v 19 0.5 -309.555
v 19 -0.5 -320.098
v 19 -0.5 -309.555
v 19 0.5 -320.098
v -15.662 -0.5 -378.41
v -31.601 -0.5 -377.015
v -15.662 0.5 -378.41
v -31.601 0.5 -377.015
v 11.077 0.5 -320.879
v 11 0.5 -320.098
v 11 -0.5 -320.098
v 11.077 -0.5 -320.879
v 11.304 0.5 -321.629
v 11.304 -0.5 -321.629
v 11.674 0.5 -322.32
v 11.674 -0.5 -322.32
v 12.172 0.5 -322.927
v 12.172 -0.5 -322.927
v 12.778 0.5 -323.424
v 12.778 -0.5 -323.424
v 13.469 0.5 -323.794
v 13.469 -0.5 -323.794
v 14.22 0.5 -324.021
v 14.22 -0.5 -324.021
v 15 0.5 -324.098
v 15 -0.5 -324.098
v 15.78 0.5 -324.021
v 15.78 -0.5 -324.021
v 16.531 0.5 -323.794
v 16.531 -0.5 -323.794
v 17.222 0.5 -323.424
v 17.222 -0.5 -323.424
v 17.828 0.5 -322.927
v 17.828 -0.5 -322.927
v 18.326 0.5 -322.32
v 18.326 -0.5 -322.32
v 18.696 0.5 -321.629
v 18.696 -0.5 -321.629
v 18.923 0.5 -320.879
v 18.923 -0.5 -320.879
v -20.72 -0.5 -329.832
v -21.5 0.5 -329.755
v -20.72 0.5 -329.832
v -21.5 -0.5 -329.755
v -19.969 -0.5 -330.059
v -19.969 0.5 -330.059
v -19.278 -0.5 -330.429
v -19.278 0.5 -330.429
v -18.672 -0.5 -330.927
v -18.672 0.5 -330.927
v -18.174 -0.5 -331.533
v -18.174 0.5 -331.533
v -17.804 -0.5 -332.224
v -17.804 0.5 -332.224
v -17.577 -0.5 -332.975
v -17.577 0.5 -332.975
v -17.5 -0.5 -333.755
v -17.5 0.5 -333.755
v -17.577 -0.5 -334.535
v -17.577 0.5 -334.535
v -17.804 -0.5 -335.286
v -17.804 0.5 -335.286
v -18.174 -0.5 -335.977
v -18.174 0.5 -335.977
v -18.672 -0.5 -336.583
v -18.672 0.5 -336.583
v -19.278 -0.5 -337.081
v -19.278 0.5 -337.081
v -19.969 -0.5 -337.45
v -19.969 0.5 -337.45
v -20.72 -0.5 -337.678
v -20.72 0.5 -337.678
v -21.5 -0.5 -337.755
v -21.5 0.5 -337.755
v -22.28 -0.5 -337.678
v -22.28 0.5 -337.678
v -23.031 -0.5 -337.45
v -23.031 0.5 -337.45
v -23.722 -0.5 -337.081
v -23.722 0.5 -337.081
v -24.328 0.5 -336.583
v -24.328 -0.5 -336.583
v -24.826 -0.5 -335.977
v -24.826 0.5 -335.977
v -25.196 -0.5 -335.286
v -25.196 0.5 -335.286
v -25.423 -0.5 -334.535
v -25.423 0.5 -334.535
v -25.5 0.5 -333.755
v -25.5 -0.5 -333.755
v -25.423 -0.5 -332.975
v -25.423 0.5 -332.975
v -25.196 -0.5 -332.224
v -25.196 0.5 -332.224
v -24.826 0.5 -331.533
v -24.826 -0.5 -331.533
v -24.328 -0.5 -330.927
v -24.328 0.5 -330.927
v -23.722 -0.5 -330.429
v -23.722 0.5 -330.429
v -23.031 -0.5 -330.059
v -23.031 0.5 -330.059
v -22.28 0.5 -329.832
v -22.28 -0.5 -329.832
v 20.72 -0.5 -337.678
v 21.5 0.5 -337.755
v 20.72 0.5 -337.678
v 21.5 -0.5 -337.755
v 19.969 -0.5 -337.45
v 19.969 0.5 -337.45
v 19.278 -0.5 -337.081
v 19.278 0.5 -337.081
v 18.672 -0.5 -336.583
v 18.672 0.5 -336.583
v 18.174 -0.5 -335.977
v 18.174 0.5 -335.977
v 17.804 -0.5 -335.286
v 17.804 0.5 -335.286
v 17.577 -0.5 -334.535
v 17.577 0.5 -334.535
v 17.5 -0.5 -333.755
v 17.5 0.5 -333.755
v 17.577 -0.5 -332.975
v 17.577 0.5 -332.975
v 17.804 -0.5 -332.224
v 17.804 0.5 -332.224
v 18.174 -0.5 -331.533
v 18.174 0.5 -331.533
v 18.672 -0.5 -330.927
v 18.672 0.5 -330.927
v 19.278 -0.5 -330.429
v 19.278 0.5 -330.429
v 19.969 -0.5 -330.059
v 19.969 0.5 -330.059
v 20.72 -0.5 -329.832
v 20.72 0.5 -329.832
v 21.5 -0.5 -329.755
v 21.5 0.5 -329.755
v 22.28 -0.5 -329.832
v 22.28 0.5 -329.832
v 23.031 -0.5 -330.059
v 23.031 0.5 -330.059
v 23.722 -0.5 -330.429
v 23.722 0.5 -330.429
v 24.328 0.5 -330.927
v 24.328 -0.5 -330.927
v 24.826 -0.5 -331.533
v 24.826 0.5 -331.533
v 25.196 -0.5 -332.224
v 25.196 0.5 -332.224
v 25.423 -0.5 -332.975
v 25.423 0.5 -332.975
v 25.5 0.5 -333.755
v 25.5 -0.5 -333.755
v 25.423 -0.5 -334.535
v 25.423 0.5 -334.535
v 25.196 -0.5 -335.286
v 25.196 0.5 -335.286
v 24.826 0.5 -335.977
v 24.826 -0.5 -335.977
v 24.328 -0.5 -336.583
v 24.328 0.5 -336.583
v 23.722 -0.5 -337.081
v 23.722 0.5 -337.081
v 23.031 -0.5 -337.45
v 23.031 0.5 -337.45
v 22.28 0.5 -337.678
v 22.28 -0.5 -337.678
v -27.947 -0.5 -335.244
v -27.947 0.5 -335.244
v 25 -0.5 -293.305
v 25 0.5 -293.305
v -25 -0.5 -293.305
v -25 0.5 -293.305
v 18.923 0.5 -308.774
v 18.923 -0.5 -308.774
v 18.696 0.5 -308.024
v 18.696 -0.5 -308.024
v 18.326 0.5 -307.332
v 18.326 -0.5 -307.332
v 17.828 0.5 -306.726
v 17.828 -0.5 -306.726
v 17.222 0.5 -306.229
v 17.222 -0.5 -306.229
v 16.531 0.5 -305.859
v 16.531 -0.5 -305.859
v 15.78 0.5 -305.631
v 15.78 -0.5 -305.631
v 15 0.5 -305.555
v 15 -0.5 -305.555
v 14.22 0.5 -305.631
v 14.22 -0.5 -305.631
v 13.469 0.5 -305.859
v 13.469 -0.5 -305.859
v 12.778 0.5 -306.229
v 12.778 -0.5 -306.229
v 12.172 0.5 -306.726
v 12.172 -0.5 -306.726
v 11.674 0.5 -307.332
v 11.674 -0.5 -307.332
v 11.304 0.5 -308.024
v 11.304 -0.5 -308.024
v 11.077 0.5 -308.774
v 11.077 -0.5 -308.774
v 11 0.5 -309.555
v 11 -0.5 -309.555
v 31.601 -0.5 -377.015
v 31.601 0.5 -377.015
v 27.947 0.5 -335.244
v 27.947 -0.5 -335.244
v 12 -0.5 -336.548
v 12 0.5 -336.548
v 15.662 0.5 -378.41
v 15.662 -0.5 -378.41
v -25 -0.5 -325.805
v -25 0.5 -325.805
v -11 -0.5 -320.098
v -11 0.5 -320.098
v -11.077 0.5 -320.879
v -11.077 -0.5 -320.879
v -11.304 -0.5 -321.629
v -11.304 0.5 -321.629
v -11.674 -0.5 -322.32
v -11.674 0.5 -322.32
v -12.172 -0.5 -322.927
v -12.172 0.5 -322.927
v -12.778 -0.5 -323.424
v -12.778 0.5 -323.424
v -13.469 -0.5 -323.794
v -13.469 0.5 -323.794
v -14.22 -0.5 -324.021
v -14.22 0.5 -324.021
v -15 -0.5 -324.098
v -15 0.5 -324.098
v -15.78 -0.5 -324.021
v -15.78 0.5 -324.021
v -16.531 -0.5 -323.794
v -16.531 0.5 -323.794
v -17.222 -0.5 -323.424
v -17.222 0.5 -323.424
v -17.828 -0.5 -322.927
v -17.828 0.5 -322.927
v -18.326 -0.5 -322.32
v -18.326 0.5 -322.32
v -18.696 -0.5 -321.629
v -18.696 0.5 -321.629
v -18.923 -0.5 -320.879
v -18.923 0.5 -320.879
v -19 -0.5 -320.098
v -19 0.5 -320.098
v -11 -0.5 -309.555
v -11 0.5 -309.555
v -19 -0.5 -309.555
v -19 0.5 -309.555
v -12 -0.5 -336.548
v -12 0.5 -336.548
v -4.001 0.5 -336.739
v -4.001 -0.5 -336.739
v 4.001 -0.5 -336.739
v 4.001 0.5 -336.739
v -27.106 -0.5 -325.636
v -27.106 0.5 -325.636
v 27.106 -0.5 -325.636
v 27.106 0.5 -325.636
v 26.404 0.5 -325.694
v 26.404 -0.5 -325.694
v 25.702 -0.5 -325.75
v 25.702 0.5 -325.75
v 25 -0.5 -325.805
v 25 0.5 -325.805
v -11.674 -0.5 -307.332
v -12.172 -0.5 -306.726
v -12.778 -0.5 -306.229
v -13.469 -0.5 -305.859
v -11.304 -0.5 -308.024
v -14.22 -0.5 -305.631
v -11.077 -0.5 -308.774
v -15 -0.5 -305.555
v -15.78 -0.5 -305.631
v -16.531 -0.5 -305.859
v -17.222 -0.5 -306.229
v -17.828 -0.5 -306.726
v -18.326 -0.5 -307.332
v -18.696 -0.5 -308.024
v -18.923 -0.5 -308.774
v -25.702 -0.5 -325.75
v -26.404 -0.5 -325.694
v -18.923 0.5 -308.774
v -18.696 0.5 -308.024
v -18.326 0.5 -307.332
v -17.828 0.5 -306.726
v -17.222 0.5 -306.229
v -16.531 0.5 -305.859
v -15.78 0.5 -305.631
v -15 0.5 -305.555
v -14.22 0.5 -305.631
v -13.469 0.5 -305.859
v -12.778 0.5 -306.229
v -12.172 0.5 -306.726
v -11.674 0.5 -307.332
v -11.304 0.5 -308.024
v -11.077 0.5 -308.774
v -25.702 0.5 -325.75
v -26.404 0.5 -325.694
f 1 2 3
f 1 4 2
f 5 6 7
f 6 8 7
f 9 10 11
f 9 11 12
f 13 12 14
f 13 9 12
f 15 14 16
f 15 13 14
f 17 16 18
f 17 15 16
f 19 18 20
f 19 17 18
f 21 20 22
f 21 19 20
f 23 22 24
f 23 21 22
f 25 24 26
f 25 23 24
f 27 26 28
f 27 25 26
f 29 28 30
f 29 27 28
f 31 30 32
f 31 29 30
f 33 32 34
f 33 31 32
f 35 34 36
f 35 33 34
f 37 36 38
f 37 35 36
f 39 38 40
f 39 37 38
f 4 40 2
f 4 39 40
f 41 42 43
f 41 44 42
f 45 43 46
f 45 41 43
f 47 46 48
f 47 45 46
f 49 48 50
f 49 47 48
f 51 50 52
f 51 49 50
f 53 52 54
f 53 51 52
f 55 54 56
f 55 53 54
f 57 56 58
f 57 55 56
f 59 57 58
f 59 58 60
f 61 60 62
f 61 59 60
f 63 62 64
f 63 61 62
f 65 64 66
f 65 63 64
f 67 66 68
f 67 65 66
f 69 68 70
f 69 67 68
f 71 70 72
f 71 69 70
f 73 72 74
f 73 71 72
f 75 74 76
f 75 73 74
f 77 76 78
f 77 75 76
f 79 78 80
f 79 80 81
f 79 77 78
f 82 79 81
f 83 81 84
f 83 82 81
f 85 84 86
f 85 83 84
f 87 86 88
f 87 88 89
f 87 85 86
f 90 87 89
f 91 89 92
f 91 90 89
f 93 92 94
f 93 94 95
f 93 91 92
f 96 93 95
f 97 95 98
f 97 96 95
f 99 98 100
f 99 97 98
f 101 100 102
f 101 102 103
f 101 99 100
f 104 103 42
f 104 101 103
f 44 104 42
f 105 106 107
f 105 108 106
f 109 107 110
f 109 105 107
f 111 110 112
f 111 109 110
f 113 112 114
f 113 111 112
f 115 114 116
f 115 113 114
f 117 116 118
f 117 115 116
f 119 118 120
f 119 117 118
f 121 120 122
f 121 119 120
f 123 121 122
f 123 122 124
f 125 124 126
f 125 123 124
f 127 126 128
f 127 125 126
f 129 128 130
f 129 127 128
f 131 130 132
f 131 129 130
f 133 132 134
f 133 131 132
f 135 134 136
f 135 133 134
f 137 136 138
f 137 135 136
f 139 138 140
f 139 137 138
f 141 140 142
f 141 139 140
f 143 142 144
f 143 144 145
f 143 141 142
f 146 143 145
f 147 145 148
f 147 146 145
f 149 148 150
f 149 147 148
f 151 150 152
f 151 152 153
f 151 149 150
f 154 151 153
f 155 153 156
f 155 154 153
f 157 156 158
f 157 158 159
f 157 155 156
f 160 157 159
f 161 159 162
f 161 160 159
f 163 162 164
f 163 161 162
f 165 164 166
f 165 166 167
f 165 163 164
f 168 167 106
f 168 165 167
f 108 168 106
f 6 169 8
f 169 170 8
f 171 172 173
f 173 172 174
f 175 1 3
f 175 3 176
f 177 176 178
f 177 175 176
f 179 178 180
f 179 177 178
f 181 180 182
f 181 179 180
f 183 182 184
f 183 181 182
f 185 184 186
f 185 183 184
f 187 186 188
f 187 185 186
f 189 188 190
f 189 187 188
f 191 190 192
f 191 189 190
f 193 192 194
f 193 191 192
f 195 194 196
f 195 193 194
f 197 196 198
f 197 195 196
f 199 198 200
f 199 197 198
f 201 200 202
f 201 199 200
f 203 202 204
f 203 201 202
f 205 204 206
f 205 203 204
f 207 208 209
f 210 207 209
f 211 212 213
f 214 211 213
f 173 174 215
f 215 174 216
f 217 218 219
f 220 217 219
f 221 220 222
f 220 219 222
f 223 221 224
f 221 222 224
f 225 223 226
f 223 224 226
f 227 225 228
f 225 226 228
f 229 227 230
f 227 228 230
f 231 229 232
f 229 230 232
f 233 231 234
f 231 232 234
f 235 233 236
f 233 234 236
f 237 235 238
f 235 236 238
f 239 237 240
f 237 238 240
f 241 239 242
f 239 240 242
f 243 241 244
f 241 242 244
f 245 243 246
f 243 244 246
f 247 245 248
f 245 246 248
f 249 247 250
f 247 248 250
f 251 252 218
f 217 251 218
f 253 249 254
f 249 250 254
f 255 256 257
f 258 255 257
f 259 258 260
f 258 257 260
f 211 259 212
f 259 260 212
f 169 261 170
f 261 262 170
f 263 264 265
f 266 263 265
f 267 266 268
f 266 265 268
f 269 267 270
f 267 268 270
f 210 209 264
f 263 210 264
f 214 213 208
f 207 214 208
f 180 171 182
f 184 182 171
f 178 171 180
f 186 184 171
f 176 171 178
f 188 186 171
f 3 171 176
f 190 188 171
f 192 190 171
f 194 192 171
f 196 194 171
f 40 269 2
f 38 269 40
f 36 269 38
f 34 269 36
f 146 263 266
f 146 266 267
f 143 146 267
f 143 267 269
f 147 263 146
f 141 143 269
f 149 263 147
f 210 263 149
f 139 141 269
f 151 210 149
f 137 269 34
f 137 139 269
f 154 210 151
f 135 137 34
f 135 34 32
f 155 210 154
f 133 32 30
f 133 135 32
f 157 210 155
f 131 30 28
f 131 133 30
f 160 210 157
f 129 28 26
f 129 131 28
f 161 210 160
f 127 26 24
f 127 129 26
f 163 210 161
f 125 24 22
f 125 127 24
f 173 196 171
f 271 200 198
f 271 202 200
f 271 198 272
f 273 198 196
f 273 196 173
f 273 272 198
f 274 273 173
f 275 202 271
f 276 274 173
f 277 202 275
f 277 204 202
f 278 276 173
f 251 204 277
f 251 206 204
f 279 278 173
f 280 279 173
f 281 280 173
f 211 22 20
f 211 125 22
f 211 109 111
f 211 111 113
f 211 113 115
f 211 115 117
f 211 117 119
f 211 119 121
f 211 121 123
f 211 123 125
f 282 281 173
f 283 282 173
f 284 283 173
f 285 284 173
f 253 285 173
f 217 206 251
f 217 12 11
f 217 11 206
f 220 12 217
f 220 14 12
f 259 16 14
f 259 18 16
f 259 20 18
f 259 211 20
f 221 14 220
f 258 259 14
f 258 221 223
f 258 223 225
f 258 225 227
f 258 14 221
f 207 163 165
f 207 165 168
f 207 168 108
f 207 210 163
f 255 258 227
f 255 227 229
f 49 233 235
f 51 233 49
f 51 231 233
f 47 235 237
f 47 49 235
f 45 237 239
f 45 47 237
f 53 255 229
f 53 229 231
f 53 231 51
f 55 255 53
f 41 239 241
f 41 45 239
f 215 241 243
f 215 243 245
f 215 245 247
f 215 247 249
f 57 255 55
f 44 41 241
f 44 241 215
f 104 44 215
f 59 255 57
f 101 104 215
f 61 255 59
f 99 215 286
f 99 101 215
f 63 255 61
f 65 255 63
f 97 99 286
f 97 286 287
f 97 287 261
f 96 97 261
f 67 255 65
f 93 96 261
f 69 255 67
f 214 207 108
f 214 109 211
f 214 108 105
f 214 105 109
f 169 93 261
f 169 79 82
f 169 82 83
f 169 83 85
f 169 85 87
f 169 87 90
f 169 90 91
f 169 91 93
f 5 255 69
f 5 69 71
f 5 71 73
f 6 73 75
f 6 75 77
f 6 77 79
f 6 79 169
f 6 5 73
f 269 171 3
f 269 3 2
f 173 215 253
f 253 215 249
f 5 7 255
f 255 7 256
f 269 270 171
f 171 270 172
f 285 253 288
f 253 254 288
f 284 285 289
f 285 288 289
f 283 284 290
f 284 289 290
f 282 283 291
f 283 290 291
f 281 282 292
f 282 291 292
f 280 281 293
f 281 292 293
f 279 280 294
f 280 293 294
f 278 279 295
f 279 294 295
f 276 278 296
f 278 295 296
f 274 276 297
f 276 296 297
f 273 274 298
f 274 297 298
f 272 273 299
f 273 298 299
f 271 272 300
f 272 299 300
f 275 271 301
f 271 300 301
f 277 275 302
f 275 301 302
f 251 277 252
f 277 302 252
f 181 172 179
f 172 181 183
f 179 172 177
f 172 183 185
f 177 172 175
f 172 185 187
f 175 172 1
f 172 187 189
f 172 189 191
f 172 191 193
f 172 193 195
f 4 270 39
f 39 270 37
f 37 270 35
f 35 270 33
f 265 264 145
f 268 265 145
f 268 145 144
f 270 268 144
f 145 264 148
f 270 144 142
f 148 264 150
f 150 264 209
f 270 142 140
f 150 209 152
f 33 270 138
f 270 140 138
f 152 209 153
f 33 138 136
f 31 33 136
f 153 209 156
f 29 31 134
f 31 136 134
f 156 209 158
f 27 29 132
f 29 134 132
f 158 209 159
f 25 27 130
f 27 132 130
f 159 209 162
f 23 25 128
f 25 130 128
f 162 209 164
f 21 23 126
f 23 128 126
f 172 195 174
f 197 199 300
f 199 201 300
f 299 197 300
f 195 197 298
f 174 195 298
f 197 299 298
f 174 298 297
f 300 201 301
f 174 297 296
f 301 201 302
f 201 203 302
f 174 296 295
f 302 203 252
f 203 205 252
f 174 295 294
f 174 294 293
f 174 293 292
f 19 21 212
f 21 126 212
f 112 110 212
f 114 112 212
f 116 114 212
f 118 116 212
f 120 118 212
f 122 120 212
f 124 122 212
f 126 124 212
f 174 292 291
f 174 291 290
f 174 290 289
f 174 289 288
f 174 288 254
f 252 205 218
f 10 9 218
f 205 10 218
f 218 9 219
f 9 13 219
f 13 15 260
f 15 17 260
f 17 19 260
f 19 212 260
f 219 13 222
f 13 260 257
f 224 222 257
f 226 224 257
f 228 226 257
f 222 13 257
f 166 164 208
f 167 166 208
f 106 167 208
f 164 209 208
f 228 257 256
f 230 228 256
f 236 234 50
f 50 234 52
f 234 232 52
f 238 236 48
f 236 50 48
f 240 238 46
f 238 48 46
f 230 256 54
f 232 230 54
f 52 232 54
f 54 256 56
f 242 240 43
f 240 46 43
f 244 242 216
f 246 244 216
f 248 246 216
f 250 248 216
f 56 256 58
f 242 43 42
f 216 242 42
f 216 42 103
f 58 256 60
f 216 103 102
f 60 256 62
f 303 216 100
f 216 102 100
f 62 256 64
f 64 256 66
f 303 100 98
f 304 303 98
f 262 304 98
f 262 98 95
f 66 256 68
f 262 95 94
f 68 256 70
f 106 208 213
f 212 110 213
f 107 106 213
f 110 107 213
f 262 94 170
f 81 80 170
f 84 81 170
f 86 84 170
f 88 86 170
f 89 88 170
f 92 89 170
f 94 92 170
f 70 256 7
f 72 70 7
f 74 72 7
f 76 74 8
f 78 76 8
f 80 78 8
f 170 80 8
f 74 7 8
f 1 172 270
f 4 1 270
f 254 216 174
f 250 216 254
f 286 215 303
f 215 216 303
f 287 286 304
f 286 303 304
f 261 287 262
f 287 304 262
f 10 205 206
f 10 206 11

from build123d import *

# Parameters (mm, degrees)
SKETCH1_R           = 4
BOSS_EXTRUDE1_DEPTH = 0.5


with BuildPart() as part:
    # Sketch1 → Boss-Extrude1 (new, symmetric)
    with BuildSketch(Plane(origin=(0, 0, 0), x_dir=(1, 0, 0), z_dir=(0, 1, 0))):
        with BuildLine():
            Line((25, 325.804578988), (25, 293.304578988))
            Line((25, 293.304578988), (-25, 293.304578988))
            Line((-25, 293.304578988), (-25, 325.804578988))
            ThreePointArc((-25, 325.804578988), (-26.053340487, 325.722039688), (-27.106408582, 325.636094902))
            Line((-27.106408582, 325.636094902), (-27.946991052, 335.243996502))
            Line((-27.946991052, 335.243996502), (-31.601486967, 377.015075947))
            Line((-31.601486967, 377.015075947), (-15.662371798, 378.409567831))
            Line((-15.662371798, 378.409567831), (-12, 336.548466633))
            ThreePointArc((-12, 336.548466633), (0, 336.762335175), (12, 336.548466633))
            Line((12, 336.548466633), (15.662371798, 378.409567831))
            Line((15.662371798, 378.409567831), (31.601486967, 377.015075947))
            Line((31.601486967, 377.015075947), (27.946991052, 335.243996502))
            Line((27.946991052, 335.243996502), (27.106408582, 325.636094902))
            ThreePointArc((27.106408582, 325.636094902), (26.053340487, 325.722039688), (25, 325.804578988))
        make_face()
        with Locations(Location((-21.5, 333.754934474, 0), (0, 0, 270))):
            Circle(SKETCH1_R, mode=Mode.SUBTRACT)
        with Locations(Location((21.5, 333.754934474, 0), (0, 0, 90))):
            Circle(SKETCH1_R, mode=Mode.SUBTRACT)
        with BuildLine():
            Line((-19, 320.098149951), (-19, 309.554578988))
            ThreePointArc((-19, 309.554578988), (-15, 305.554578988), (-11, 309.554578988))
            Line((-11, 309.554578988), (-11, 320.098149951))
            ThreePointArc((-11, 320.098149951), (-15, 324.098149951), (-19, 320.098149951))
        make_face(mode=Mode.SUBTRACT)
        with BuildLine():
            Line((19, 320.098149951), (19, 309.554578988))
            ThreePointArc((19, 309.554578988), (15, 305.554578988), (11, 309.554578988))
            Line((11, 309.554578988), (11, 320.098149951))
            ThreePointArc((11, 320.098149951), (15, 324.098149951), (19, 320.098149951))
        make_face(mode=Mode.SUBTRACT)
    extrude(amount=BOSS_EXTRUDE1_DEPTH, both=True)


solid = part.part
